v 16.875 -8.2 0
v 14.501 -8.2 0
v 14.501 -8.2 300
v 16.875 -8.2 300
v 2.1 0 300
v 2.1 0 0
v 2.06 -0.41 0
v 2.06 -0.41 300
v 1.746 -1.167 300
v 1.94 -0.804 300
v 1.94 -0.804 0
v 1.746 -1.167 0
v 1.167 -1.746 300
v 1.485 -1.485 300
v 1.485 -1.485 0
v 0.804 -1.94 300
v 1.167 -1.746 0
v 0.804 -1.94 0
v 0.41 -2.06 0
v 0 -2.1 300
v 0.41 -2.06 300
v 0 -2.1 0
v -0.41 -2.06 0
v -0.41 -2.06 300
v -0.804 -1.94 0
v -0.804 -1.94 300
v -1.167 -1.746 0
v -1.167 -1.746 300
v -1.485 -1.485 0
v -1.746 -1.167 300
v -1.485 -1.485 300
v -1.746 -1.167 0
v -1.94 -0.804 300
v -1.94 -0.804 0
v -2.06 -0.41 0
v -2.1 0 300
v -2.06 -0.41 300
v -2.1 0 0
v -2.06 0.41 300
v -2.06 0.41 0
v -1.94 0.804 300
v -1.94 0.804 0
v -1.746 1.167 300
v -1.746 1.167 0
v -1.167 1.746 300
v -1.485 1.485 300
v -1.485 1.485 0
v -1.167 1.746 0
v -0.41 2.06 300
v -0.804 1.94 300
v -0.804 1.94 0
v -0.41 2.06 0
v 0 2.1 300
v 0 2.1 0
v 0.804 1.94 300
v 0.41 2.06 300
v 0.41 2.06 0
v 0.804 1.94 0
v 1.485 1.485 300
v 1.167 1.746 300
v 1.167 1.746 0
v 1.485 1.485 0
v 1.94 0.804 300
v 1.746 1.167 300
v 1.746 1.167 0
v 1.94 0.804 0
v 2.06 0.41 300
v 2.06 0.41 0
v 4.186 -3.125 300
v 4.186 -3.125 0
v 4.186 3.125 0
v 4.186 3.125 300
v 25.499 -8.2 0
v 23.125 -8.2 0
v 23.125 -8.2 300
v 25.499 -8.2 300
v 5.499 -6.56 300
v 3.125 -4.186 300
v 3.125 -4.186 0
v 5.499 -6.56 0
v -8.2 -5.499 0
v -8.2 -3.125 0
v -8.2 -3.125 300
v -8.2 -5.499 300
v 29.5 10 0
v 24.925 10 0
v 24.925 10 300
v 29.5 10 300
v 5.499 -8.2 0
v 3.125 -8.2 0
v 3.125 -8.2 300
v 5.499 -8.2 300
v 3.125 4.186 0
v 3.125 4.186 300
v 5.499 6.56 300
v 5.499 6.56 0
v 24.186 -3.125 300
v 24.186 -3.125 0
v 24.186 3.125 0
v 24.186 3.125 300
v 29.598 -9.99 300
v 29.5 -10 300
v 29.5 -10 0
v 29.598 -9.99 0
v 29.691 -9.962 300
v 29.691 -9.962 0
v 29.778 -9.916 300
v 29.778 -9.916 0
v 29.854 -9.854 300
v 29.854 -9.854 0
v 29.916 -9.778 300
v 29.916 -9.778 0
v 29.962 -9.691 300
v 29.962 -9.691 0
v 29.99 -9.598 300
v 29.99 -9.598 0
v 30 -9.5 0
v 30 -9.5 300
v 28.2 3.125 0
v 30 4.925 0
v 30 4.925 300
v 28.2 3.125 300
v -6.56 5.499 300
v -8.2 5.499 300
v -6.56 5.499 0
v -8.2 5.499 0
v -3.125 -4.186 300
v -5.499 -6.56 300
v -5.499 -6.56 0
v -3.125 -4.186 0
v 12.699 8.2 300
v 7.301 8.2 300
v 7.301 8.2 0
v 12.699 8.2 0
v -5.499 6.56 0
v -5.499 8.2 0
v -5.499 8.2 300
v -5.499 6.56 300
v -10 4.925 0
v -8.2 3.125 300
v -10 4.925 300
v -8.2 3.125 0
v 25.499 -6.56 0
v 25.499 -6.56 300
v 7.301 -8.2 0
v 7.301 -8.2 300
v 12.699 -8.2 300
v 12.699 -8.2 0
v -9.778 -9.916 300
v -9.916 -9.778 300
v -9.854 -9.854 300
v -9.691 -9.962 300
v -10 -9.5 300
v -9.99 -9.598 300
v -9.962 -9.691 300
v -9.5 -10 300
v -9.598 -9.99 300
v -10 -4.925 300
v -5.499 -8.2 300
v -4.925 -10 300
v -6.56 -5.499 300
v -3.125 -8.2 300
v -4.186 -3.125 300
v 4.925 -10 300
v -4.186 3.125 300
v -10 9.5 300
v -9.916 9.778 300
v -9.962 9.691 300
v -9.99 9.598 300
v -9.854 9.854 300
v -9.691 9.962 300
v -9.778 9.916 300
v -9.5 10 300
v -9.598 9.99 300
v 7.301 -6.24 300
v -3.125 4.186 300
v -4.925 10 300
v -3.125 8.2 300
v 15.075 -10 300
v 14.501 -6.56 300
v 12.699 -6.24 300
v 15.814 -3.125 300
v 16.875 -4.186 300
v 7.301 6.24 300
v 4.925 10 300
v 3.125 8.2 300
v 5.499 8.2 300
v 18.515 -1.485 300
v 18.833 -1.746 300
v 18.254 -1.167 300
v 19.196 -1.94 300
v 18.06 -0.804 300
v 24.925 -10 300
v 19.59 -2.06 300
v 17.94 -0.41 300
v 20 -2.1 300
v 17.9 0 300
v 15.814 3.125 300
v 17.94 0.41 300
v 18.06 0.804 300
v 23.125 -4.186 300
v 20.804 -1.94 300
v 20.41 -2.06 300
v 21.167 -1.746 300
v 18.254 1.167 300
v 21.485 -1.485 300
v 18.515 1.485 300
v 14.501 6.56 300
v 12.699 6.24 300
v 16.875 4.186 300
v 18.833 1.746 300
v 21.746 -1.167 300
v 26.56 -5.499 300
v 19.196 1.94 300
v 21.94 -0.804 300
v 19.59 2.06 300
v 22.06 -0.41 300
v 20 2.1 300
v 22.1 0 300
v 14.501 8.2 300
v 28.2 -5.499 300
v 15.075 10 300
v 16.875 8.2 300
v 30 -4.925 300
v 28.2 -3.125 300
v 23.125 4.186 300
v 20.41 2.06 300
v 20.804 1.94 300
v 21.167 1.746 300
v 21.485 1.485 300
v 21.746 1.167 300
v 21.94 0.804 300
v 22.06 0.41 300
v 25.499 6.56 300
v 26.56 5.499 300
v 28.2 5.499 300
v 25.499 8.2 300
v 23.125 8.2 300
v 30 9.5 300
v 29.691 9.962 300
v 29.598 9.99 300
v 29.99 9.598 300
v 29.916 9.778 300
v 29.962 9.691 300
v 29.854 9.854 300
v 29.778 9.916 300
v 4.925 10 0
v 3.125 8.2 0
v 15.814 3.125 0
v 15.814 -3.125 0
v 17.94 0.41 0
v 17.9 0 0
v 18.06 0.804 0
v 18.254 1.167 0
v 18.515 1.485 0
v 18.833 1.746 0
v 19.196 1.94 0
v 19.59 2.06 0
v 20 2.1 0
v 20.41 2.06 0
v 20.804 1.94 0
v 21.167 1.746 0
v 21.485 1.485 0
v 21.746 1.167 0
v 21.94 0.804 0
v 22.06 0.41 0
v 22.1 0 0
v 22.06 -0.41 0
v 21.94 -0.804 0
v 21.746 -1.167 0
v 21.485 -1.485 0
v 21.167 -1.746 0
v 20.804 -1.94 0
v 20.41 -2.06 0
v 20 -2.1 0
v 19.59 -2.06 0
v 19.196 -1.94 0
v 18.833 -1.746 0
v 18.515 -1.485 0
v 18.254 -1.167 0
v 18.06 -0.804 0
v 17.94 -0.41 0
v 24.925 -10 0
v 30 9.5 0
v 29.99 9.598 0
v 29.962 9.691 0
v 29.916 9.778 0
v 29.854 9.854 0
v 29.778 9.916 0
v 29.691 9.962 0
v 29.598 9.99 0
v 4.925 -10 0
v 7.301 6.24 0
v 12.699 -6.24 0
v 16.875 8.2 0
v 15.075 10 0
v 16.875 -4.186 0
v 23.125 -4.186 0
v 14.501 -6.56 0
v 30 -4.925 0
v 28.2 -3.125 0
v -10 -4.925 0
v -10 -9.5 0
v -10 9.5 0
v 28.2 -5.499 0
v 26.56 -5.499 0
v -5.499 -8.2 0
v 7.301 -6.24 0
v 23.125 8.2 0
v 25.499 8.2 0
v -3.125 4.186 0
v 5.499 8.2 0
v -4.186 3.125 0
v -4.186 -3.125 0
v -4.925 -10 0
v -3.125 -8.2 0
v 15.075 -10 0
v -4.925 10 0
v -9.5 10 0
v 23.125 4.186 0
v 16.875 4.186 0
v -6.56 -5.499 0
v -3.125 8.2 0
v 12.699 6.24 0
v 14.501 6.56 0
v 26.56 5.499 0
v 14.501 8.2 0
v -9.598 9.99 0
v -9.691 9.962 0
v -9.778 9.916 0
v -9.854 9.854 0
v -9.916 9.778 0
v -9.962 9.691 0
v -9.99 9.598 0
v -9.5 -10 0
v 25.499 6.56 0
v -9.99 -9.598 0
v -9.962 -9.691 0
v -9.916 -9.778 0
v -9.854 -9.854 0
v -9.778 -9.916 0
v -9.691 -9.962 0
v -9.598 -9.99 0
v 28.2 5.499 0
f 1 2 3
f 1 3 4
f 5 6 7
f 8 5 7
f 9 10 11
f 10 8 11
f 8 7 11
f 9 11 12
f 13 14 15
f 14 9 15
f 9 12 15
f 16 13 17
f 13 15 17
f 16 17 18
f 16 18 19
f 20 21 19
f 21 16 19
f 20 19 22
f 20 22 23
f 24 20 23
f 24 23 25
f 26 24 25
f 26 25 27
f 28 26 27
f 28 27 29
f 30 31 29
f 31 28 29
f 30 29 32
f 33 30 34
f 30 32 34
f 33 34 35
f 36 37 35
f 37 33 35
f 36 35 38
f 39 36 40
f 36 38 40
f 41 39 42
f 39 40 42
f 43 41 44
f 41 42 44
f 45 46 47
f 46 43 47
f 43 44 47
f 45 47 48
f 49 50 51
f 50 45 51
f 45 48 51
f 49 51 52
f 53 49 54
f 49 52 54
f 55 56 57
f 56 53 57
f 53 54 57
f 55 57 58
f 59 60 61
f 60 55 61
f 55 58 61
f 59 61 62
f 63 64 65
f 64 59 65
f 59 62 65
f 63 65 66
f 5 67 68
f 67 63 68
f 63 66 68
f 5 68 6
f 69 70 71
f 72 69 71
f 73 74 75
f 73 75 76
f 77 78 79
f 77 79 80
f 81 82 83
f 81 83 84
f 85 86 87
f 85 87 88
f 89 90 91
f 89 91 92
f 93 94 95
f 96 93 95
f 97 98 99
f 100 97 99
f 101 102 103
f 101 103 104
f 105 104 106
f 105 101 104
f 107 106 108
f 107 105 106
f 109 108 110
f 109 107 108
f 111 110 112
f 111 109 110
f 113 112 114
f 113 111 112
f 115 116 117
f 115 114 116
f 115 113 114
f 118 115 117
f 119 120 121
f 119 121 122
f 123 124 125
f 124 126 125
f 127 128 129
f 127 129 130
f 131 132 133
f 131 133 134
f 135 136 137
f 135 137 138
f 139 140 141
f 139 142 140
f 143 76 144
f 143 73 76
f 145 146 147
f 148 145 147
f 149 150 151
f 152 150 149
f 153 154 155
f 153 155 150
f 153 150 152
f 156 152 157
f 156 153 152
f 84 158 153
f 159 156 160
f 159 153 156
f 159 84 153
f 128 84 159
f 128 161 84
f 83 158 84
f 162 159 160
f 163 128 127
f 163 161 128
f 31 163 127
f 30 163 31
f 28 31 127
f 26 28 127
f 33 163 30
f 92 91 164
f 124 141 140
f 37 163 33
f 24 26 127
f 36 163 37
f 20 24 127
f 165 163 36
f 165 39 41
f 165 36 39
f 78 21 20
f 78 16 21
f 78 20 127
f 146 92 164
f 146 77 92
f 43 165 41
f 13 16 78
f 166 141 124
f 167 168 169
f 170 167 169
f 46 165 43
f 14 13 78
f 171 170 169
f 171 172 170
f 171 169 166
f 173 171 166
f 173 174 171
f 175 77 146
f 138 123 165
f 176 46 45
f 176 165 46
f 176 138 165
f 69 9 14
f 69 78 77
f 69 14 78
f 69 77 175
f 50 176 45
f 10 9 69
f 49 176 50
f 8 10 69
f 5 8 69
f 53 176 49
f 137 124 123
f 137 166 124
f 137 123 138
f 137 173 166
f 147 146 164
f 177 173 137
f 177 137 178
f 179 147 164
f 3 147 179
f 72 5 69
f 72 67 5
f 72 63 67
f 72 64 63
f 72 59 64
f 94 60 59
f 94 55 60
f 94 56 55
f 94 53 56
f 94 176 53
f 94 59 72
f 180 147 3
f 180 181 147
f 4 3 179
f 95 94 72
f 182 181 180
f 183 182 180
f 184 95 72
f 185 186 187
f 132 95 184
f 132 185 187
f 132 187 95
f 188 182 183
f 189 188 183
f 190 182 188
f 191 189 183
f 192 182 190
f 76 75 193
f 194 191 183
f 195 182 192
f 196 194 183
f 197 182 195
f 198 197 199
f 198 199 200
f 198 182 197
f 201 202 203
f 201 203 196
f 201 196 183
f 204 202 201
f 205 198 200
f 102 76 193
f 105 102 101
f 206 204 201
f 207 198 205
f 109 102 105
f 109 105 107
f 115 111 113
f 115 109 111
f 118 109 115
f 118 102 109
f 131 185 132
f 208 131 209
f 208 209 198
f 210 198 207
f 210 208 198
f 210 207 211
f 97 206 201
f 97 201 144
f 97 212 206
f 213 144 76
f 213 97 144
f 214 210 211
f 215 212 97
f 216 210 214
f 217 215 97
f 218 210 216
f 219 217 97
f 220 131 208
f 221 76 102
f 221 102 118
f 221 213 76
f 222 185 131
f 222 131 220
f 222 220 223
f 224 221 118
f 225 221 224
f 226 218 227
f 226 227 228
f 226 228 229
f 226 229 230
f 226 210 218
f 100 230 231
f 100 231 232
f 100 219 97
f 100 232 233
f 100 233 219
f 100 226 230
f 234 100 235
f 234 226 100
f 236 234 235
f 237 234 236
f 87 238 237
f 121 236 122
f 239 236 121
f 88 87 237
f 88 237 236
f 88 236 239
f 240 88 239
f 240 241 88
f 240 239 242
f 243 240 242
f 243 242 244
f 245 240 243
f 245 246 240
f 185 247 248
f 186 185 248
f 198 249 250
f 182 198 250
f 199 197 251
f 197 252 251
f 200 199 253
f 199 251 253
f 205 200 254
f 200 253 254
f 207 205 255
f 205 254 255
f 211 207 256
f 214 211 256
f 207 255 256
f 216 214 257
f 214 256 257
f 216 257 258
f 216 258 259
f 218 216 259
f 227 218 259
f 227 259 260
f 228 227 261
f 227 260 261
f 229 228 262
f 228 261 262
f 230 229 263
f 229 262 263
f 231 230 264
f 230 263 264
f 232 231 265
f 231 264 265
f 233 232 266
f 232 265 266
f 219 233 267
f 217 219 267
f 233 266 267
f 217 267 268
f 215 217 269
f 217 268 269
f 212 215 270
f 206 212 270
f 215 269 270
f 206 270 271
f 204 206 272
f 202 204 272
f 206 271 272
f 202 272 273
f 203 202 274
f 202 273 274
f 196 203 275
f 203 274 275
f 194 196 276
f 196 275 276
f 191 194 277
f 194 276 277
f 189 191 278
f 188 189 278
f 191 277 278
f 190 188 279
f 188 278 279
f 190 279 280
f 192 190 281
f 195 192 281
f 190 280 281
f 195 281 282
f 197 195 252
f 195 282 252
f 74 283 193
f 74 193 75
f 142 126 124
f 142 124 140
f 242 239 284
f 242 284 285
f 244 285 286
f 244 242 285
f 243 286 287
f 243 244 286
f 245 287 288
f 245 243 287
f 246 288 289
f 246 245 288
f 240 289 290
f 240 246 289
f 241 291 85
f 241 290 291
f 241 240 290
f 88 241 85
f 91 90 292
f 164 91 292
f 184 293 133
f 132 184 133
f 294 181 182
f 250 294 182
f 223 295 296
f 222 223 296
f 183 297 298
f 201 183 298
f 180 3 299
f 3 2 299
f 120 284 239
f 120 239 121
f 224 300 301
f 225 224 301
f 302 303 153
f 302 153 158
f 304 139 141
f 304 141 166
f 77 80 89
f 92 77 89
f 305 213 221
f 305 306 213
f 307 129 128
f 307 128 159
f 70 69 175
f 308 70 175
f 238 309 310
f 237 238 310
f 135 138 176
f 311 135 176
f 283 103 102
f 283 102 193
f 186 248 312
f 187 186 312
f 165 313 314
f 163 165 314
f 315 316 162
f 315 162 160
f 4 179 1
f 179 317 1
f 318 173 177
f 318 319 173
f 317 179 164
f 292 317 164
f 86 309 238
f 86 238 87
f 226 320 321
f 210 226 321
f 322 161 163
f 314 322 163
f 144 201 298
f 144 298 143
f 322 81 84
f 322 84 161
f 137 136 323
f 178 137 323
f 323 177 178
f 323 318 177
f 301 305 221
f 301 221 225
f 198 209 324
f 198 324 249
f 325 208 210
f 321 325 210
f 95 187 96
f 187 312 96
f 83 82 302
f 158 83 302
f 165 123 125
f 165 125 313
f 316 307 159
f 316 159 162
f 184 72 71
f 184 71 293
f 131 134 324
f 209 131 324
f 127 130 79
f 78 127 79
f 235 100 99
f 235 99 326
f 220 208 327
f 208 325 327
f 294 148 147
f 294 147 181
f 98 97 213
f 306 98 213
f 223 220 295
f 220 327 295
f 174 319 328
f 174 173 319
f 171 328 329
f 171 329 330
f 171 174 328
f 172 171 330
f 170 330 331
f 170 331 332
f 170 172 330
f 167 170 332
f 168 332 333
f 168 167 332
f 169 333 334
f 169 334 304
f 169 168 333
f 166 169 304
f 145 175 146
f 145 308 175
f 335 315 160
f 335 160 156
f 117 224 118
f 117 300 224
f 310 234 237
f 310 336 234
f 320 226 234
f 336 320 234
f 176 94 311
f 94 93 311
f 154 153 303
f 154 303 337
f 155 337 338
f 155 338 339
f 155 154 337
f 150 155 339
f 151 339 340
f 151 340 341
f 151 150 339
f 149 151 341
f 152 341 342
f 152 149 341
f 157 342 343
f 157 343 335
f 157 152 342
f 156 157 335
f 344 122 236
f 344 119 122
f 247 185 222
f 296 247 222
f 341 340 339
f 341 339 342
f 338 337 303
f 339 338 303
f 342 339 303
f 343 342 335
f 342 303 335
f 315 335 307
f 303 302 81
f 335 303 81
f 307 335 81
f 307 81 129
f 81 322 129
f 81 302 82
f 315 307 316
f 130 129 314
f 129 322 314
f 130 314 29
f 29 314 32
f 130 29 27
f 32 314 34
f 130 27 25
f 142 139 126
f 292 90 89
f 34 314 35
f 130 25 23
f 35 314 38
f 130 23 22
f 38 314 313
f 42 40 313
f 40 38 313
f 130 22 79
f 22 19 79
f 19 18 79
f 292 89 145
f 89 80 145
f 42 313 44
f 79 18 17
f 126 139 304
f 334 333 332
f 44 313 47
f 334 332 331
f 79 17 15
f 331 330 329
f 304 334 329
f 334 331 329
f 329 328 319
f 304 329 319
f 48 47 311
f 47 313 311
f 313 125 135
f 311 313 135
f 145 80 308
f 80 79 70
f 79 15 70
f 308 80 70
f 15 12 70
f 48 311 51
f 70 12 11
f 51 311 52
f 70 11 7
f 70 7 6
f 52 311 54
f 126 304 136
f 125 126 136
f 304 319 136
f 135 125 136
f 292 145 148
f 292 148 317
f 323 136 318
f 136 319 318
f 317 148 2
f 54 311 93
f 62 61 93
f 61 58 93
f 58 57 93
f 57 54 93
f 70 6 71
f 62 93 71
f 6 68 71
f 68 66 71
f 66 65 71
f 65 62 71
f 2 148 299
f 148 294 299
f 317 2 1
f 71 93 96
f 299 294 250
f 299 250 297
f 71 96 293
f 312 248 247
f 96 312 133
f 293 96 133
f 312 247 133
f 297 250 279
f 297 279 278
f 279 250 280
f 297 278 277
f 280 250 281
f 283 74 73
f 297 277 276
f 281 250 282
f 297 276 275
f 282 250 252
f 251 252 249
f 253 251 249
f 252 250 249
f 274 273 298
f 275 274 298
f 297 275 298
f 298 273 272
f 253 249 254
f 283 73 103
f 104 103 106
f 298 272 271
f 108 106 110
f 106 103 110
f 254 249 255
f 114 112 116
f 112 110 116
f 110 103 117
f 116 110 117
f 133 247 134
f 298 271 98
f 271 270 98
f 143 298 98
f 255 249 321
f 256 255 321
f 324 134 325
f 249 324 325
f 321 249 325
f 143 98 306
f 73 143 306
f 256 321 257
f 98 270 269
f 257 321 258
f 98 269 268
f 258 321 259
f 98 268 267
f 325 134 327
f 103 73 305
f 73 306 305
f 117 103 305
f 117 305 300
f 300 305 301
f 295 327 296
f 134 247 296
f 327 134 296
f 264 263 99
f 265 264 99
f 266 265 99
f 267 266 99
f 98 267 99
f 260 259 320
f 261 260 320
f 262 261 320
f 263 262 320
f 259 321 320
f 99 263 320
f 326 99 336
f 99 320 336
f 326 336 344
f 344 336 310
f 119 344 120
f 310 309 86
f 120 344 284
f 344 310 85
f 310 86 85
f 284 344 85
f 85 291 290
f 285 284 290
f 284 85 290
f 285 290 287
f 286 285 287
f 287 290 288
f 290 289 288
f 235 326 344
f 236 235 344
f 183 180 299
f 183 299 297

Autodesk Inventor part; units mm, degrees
ref_plane "YZ Plane" through (0, 0, 0) normal (1, 0, 0) x (0, 1, 0)
ref_plane "XZ Plane" through (0, 0, 0) normal (0, 1, 0) x (-1, 0, 0)
sketch "Szkic1" plane through (0, 0, 0) normal (0, 0, 1) x (1, 0, 0)
  circle A0 centre (0, 0) radius 2.1
  line L0 (-10, 10) -> (10, 10)
  line L1 (10, 10) -> (10, -10)
  line L2 (10, -10) -> (-10, -10)
  line L3 (-10, -10) -> (-10, 10)
  line L4 (-10, -10) -> (10, 10) construction
  line L5 (10, -10) -> (-10, 10) construction
  line L6 (-10, 8.2) -> (10, 8.2)
  line L7 (-10, -8.2) -> (10, -8.2)
  line L8 (-8.2, 10) -> (-8.2, -10)
  line L9 (10, 10) -> (30, 10)
  line L10 (30, 10) -> (30, -10)
  line L11 (30, -10) -> (10, -10)
  line L12 (10, -10) -> (10, 10)
  line L13 (-4.1857, -4.1857) -> (4.1857, -4.1857)
  line L14 (4.1857, -4.1857) -> (4.1857, 4.1857)
  line L15 (4.1857, 4.1857) -> (-4.1857, 4.1857)
  line L16 (-4.1857, 4.1857) -> (-4.1857, -4.1857)
  line L17 (-8.2, 7.1393) -> (-4.1857, 3.125)
  line L18 (-7.1393, 8.2) -> (-3.125, 4.1857)
  line L19 (-4.925, 10) -> (-3.125, 8.2)
  line L20 (4.925, 10) -> (3.125, 8.2)
  line L21 (-3.125, -8.2) -> (-4.925, -10)
  line L22 (3.125, -8.2) -> (4.925, -10)
  line L23 (-8.2, -7.1393) -> (-4.1857, -3.125)
  line L24 (-7.1393, -8.2) -> (-3.125, -4.1857)
  line L25 (3.125, -4.1857) -> (7.1393, -8.2)
  line L26 (4.1857, -3.125) -> (7.3007, -6.24)
  line L27 (4.1857, 3.125) -> (7.3007, 6.24)
  line L28 (3.125, 4.1857) -> (7.1393, 8.2)
  line L29 (-5.4993, 8.2) -> (-5.4993, 6.56)
  line L30 (5.4993, 8.2) -> (5.4993, 6.56)
  line L31 (-8.2, 5.4993) -> (-6.56, 5.4993)
  line L32 (-8.2, -5.4993) -> (-6.56, -5.4993)
  line L33 (-5.4993, -6.56) -> (-5.4993, -8.2)
  line L34 (5.4993, -6.56) -> (5.4993, -8.2)
  line L35 (-8.2, 3.125) -> (-10, 4.925)
  line L36 (-8.2, -3.125) -> (-10, -4.925)
  line L37 (7.3007, 6.24) -> (7.3007, 8.2)
  line L38 (7.3007, -6.24) -> (7.3007, -8.2)
  point P0 (0, -8.2)
  point P1 (-8.2, -8.2)
  point P2 (-8.2, 8.2)
  dimension "d0" = 4.2
  dimension "d1" = 20
  dimension "d2" = 1.8
  dimension "d4" = 20
  dimension "d5" = 20
  dimension "d6" = 1.8
  dimension "d7" = 1.8
  dimension "d8" = 1.5
  dimension "d9" = 0.75
  dimension "d10" = 135
  dimension "d11" = 6.25
  dimension "d12" = 3.125
  dimension "d13" = 1.5
  dimension "d14" = 1.5
  dimension "d15" = 1.5
  dimension "d16" = 0.75
  dimension "d17" = 0.75
  dimension "d18" = 0.75
  dimension "d19" = 1.64
  dimension "d20" = 1.64
  dimension "d21" = 1.64
  dimension "d22" = 1.64
  dimension "d23" = 1.64
  dimension "d24" = 1.64
  dimension "d25" = 45
  dimension "d30" = 1.96
  dimension "d31" = 1.96
extrude "Wyciągnięcie proste1" add sketch "Szkic1" along normal blind 300 contours L0 L8 L6 L3 | L0 L19 L6 L8 | L6 L8 L35 L3 | L6 L18 L15 L16 L17 L8 | L0 L1 L6 L20 | L6 L29 L18 | L17 L31 L8 | L36 L8 L7 L3 | L7 L8 L2 L3 | L6 L28 L30 | L15 L14 L13 L16 | L8 L23 L16 L13 L24 L7 | L7 L21 L2 L8 | L32 L23 L8 | L1 L2 L22 L7 | L37 L27 L14 L15 L28 L6 | L24 L33 L7 | L7 L25 L13 L14 L26 L38 | L7 L34 L25
ref_plane "Płaszczyzna konstrukcyjna1" through (10, 8.2, 0) normal (1, 0, 0) x (0, 0, -1)
mirror "Odbij1" about plane through (10, 8.2, 0) normal (1, 0, 0) of "Wyciągnięcie proste1"
fillet "Zaokrąglenie1" radius 0.5 4 edges at (-10, 10, 150) (-10, -10, 150) (30, 10, 150) (30, -10, 150)
properties part number "2040vslot_long"
